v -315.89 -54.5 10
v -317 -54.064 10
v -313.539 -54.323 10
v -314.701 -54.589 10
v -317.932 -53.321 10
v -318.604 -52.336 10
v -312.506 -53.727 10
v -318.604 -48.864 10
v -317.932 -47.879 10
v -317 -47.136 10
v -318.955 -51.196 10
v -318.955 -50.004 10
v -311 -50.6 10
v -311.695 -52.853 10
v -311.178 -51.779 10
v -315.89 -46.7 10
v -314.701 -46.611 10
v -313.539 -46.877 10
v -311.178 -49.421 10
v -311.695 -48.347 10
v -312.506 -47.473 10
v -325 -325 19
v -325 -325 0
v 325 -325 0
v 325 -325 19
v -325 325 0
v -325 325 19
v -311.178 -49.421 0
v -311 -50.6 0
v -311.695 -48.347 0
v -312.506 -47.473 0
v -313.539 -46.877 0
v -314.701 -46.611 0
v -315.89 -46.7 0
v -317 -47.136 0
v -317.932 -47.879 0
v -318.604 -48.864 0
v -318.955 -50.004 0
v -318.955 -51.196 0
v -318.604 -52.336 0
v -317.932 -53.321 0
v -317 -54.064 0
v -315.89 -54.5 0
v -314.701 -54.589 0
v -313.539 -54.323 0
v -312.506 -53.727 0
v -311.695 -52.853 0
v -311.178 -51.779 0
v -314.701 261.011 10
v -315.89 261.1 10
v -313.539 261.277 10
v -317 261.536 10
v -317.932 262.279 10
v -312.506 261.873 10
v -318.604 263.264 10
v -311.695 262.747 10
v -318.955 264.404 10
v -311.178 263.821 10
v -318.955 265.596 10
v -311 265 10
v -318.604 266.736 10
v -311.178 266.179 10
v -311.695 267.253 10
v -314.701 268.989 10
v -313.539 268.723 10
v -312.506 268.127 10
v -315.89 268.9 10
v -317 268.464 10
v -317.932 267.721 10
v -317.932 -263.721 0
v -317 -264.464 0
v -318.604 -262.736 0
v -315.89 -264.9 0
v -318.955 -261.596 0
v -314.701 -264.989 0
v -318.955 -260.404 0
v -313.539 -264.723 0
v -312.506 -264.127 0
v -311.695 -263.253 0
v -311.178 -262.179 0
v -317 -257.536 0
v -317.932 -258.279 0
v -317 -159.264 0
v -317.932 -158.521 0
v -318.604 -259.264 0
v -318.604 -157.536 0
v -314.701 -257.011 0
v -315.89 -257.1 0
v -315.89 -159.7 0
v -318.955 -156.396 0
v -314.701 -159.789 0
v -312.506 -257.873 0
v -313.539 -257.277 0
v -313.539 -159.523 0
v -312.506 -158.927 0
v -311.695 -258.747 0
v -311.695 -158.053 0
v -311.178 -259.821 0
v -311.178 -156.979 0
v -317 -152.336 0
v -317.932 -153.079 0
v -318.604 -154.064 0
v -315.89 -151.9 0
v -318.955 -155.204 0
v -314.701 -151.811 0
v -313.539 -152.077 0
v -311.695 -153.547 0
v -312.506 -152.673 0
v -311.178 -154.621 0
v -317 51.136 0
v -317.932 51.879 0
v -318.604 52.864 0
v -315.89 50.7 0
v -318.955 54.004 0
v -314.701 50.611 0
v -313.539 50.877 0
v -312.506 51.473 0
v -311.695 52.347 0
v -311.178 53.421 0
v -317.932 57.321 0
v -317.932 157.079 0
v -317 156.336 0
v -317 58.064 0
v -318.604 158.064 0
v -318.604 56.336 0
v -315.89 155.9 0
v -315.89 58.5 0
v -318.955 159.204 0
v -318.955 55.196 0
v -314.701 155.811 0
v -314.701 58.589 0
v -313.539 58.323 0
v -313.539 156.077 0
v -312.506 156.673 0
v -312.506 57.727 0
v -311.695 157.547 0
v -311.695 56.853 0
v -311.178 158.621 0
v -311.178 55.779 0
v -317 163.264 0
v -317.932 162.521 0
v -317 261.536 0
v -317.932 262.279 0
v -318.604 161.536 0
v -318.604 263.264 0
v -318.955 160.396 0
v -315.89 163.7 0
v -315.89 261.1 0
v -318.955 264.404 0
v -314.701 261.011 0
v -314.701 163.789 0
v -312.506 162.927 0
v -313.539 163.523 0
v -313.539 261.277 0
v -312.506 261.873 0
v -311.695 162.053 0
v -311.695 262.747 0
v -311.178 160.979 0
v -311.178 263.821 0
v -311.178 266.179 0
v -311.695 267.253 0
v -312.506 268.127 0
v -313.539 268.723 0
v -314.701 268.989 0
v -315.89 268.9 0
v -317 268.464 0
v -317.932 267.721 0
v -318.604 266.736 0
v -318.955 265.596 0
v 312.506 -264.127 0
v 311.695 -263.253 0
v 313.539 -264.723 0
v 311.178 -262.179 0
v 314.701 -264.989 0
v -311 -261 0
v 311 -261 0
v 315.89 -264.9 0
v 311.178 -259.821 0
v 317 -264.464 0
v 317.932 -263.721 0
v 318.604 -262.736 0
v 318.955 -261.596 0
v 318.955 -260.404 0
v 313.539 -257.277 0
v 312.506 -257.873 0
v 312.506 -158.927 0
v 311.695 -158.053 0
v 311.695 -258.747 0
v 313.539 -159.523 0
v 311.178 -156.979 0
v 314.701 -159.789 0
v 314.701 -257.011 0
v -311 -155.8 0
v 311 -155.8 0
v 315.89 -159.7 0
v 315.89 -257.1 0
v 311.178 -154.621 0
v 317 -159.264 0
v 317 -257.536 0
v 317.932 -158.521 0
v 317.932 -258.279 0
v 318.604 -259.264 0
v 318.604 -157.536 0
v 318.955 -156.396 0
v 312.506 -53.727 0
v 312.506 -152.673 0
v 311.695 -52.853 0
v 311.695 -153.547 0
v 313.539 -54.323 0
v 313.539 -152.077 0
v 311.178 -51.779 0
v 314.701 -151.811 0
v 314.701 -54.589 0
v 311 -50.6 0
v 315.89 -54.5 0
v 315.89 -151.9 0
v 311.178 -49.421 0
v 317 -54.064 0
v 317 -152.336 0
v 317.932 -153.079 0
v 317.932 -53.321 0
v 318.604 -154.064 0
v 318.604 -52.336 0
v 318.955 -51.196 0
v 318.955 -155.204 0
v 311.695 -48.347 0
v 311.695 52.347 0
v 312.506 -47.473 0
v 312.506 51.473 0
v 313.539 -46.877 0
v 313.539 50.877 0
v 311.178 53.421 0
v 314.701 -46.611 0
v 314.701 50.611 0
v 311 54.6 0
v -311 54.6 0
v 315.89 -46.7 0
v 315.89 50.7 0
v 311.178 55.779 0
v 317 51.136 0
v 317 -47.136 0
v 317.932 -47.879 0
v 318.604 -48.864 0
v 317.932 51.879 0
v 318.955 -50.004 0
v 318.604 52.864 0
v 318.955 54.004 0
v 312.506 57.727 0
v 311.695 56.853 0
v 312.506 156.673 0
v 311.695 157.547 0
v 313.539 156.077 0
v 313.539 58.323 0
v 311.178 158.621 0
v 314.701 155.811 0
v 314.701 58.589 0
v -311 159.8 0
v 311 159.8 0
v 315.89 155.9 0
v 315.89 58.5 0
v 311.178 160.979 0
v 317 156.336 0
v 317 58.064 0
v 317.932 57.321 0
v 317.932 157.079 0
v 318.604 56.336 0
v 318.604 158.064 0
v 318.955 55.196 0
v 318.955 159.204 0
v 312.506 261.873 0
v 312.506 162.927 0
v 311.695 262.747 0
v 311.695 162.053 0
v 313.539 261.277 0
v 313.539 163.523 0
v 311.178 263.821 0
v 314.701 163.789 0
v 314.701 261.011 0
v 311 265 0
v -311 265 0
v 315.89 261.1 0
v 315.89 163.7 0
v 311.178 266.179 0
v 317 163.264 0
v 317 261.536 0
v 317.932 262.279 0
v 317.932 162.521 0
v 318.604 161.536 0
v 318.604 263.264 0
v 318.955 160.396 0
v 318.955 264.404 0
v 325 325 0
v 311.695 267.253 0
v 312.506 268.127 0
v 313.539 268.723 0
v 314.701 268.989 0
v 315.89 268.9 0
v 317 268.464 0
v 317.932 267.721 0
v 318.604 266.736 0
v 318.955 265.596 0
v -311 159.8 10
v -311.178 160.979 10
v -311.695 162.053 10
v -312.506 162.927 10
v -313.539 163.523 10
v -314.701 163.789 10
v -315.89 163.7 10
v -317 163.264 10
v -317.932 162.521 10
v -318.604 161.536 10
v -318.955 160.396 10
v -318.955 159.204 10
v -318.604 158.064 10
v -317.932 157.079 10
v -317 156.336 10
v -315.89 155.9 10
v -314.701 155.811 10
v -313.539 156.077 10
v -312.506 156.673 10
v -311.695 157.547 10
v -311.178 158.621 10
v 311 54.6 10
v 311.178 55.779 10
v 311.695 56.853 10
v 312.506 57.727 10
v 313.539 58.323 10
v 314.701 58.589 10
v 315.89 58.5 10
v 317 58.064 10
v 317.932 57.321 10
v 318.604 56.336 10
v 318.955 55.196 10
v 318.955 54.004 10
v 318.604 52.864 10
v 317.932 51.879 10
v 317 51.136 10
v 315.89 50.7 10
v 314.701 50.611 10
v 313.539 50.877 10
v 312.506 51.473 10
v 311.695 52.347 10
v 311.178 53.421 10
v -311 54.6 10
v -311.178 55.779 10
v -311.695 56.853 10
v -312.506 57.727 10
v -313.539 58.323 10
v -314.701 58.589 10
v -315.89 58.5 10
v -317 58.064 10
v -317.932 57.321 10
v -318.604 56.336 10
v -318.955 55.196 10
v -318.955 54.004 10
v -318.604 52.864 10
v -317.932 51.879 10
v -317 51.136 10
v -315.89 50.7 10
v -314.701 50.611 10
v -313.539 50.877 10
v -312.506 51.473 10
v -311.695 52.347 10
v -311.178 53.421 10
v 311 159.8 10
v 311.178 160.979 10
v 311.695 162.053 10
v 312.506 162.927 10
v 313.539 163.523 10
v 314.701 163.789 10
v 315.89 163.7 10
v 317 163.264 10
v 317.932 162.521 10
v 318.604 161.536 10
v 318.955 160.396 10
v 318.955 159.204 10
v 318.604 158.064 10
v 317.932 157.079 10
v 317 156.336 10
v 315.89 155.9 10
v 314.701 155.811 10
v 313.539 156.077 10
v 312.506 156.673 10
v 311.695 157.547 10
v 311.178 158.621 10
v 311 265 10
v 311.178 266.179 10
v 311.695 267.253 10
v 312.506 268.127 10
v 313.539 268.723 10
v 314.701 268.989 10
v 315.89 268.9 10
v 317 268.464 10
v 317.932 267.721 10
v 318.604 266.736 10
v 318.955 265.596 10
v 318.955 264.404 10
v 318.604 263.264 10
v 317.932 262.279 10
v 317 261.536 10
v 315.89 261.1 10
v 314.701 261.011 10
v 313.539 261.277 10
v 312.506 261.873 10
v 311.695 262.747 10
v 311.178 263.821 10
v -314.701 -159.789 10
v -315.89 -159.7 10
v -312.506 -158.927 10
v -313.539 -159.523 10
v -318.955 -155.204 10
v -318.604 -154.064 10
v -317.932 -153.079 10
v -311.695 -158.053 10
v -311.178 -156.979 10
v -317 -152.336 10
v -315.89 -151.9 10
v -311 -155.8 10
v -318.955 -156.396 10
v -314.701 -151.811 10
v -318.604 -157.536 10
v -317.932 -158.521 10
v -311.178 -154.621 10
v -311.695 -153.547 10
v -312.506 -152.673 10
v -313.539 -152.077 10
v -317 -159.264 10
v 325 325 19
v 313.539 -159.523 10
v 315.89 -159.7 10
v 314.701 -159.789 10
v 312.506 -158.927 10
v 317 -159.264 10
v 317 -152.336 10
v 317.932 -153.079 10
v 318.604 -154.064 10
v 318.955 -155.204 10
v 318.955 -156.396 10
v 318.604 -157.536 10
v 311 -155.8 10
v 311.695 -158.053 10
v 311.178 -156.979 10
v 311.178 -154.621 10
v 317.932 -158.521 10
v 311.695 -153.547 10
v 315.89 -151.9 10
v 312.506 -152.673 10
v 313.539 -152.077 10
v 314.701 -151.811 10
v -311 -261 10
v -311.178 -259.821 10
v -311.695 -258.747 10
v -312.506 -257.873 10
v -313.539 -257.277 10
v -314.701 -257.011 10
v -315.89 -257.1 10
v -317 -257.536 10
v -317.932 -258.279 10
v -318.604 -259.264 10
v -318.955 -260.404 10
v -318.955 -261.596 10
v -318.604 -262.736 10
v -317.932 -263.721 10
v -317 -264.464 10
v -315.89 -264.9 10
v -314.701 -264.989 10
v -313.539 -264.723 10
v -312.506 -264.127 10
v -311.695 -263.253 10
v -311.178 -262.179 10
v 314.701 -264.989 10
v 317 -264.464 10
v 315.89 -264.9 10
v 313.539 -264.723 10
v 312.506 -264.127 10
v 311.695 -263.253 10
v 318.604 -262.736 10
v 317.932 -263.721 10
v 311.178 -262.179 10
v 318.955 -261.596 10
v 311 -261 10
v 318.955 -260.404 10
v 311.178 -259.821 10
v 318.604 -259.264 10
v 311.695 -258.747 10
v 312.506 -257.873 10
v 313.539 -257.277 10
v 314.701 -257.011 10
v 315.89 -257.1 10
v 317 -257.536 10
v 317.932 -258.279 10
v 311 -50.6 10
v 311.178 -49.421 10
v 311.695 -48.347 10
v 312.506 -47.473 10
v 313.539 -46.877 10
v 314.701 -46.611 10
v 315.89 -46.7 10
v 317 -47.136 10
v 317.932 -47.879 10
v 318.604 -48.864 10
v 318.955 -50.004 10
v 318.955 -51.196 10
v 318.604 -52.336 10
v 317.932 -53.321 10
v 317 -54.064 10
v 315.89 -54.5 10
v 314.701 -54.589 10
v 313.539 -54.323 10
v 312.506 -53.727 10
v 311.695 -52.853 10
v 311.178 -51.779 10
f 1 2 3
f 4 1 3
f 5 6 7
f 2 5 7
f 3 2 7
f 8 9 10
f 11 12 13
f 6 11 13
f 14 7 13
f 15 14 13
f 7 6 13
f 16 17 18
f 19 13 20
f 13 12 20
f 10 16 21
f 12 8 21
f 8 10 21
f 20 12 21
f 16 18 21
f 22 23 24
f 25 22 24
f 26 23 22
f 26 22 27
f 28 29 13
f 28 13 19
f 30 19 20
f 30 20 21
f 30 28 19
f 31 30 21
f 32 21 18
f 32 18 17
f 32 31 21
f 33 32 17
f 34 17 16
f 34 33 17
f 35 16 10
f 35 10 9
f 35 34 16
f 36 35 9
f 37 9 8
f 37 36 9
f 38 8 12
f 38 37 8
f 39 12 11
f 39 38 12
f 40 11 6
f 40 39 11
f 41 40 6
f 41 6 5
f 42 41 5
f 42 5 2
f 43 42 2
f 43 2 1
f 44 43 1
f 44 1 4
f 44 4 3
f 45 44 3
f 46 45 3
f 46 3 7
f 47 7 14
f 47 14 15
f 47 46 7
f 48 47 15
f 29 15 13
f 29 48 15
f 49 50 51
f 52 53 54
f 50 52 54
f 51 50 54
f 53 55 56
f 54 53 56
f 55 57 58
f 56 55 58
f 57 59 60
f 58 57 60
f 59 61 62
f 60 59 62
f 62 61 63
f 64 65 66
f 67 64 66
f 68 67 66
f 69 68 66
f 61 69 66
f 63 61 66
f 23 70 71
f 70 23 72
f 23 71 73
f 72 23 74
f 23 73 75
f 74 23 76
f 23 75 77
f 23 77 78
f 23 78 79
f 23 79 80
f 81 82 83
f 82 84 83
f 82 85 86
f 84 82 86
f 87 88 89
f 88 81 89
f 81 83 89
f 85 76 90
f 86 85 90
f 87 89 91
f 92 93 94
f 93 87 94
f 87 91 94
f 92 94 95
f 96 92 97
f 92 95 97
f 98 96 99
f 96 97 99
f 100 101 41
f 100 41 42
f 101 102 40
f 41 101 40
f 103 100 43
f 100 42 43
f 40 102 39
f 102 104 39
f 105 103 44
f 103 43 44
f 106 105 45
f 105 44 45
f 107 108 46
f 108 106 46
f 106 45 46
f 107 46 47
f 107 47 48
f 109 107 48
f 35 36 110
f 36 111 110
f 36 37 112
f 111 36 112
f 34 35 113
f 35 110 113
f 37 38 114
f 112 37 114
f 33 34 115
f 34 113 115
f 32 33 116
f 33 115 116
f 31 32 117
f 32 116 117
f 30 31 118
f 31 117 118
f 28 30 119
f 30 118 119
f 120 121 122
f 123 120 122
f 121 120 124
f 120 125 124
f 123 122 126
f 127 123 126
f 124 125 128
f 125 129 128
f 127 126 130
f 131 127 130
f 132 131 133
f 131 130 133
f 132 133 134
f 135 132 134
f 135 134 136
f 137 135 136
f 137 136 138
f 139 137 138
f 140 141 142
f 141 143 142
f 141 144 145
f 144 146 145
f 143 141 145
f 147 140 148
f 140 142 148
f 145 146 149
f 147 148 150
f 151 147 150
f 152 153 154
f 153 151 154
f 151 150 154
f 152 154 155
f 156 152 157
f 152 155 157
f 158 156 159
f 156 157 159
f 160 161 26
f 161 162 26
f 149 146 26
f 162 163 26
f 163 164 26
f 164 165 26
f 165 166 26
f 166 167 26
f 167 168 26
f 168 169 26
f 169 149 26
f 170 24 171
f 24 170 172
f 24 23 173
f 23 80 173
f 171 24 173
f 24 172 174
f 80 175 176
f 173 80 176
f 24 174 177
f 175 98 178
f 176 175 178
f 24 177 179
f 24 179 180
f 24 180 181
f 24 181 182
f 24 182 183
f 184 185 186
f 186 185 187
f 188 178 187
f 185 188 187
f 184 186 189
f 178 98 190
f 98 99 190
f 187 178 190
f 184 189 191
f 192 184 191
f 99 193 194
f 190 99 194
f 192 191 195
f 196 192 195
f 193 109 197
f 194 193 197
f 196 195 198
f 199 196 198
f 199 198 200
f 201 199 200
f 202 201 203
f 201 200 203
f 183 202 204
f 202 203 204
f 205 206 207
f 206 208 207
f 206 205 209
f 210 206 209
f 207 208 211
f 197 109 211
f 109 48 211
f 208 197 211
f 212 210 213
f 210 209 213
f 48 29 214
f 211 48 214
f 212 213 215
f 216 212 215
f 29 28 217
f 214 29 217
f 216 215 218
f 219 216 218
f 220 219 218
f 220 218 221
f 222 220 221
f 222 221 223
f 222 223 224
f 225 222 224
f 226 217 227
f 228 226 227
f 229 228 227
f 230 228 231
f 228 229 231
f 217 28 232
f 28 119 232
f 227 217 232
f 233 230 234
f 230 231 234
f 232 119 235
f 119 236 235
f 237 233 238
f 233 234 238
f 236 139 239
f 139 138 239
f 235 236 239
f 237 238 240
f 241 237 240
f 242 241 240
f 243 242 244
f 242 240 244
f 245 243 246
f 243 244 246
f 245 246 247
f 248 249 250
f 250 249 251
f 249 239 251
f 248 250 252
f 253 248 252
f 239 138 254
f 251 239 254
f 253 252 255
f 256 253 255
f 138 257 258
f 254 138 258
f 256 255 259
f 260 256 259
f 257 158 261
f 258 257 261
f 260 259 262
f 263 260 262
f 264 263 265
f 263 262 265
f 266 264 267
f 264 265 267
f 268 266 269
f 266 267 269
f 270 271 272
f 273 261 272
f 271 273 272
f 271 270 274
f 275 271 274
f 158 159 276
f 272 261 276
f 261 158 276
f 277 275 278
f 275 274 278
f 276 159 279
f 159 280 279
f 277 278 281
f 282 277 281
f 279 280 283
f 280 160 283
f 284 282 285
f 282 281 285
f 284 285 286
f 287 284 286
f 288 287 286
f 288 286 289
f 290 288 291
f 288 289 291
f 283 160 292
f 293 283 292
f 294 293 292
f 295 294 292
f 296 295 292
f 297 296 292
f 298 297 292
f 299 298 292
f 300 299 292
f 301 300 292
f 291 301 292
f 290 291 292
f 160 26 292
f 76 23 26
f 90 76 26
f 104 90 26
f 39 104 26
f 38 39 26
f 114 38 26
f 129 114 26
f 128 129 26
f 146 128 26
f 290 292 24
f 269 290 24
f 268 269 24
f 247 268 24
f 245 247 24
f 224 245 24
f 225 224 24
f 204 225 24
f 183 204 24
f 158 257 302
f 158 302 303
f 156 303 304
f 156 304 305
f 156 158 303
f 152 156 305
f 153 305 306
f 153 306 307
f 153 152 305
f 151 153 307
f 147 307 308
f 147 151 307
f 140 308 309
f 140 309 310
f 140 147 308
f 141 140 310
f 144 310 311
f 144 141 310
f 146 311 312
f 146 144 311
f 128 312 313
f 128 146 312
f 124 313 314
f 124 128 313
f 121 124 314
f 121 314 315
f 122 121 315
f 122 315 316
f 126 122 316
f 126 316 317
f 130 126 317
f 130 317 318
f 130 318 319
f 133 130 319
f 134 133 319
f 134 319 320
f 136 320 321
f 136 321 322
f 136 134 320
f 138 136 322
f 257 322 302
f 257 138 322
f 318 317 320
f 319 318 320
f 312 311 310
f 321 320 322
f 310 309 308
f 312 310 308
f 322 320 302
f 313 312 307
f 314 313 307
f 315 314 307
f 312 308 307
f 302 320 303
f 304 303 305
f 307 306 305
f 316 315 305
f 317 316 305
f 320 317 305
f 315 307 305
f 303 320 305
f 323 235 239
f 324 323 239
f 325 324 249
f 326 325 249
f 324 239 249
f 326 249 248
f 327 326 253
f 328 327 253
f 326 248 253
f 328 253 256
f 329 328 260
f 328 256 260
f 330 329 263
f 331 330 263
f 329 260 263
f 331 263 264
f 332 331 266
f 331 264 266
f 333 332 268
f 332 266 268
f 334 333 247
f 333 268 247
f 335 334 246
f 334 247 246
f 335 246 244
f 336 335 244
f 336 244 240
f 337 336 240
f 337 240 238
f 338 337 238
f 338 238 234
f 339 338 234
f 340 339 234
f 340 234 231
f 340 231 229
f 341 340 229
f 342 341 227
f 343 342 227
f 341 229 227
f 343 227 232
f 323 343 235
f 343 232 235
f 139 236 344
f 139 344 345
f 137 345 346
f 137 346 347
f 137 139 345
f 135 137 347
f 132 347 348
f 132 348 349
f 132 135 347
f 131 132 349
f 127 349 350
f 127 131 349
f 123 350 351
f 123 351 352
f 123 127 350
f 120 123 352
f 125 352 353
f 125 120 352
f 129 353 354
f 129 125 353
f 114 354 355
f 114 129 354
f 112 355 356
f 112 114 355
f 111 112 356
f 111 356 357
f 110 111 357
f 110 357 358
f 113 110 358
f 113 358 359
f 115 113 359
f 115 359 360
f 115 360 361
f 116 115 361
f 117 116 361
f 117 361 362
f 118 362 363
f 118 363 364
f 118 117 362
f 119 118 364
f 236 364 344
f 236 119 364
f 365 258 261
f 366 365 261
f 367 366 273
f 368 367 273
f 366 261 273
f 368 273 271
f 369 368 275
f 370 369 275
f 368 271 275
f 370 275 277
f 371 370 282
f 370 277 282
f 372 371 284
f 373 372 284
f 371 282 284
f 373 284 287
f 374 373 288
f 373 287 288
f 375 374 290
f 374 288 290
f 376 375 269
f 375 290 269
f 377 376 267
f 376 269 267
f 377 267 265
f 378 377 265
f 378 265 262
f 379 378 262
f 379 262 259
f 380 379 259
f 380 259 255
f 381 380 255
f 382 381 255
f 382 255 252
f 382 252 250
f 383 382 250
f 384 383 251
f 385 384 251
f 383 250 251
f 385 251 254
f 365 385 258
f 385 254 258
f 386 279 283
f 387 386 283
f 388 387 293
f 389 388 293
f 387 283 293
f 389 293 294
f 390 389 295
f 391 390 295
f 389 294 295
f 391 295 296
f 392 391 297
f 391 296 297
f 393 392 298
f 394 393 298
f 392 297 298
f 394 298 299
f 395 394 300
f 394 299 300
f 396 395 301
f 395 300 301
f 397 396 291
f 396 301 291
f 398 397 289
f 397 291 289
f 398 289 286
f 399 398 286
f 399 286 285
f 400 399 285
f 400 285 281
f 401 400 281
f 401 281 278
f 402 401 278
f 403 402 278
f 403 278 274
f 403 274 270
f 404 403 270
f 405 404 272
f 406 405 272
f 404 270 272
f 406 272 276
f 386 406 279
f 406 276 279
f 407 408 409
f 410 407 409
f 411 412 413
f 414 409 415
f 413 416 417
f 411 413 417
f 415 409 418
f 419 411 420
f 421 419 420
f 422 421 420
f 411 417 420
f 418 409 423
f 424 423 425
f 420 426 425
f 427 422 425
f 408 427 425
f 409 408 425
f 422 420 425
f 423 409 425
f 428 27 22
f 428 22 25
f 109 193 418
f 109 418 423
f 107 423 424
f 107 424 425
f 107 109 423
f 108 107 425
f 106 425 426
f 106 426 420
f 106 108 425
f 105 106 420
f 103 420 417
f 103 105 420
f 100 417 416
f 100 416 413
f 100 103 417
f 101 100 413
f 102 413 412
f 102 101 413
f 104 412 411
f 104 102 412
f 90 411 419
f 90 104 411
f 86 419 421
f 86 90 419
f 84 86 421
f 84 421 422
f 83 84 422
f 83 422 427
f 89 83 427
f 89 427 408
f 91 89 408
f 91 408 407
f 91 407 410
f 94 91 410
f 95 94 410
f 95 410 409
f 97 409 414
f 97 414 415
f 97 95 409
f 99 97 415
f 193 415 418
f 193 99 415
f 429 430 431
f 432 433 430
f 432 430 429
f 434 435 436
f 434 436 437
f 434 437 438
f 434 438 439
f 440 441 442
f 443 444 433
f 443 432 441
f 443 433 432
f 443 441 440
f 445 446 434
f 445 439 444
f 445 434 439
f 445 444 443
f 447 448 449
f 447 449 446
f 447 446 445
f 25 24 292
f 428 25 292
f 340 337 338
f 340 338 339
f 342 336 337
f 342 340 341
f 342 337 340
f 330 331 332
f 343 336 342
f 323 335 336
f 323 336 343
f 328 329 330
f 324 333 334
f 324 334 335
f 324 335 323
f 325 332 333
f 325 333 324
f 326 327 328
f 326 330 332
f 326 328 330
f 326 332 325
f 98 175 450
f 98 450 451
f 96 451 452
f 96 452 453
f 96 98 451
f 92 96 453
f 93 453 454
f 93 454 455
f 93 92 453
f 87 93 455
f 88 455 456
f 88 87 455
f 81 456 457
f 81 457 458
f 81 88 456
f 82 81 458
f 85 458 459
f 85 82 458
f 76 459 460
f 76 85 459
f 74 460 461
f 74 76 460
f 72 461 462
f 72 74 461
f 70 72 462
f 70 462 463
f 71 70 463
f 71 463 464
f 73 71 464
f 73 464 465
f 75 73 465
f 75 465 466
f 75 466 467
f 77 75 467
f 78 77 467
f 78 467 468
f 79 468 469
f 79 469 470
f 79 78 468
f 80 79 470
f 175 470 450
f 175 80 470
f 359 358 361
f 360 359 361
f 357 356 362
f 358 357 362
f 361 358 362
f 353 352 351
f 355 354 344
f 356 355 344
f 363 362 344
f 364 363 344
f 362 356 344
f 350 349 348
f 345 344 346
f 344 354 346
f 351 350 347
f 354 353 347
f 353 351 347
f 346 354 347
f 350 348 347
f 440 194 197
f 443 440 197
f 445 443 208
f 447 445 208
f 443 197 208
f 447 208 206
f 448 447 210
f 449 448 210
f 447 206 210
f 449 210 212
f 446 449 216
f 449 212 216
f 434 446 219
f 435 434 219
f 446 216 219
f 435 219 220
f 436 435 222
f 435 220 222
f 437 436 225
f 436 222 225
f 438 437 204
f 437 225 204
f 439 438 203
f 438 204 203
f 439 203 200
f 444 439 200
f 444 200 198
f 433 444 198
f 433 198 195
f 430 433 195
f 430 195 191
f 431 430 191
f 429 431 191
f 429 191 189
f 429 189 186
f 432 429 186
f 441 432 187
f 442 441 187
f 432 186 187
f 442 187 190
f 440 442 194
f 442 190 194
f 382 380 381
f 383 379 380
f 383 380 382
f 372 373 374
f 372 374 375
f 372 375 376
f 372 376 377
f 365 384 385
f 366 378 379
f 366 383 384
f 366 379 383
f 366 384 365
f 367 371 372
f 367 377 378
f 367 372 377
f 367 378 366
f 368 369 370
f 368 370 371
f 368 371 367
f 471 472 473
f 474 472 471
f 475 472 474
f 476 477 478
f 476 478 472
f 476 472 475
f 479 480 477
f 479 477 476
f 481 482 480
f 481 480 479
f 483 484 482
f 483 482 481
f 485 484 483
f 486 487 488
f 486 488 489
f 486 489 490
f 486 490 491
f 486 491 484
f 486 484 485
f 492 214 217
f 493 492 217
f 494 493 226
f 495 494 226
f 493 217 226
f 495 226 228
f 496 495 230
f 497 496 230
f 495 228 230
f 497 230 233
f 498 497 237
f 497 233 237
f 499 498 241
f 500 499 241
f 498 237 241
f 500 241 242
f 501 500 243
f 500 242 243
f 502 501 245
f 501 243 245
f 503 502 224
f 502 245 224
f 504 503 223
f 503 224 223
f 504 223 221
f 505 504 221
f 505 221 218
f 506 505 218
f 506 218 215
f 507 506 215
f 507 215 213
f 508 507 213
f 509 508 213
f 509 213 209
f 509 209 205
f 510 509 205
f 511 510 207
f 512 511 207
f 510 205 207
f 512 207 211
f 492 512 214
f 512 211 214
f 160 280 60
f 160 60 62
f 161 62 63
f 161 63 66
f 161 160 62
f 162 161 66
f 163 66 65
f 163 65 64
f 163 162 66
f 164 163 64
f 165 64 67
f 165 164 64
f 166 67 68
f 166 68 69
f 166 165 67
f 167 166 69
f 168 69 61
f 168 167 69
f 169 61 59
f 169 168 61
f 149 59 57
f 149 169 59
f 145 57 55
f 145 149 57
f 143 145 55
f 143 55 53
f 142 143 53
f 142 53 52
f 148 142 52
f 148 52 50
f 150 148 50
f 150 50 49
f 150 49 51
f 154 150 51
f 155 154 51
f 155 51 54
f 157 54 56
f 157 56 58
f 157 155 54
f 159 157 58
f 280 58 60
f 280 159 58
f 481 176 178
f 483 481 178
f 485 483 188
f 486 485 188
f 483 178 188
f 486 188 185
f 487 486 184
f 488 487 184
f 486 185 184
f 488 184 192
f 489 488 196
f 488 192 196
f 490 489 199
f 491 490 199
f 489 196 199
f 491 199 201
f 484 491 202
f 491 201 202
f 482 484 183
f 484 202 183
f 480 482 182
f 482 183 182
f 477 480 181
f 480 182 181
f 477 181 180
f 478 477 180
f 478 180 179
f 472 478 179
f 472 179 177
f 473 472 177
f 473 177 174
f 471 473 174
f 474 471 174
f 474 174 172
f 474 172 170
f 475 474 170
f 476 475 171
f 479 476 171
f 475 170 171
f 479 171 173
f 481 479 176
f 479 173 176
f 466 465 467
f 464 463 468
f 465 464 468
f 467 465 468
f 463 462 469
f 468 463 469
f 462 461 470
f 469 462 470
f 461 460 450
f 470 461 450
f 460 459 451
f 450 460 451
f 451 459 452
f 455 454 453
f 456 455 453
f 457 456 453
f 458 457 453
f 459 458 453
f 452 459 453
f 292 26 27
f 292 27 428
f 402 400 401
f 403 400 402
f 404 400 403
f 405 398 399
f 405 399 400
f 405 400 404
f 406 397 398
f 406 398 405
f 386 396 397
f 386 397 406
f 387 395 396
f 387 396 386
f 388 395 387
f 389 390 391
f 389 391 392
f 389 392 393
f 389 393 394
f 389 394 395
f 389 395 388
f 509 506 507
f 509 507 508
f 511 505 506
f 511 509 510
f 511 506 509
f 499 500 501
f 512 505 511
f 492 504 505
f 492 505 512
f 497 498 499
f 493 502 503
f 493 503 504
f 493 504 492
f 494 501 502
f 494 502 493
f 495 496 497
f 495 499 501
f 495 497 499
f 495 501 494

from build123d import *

# Parameters (mm, degrees)
F0_W     = 650
F0_H     = 650
F0_R     = 4
F1_DEPTH = 19
F2_DEPTH = 10


# Not quite as in the source:
# - a pattern or mirror of a feature is missing from the dataset's text; its kind, count and spacing are read off the source's solid


with BuildPart() as f1:
    # F0 (on Top) → F1 (new body)
    with BuildSketch(Plane.XY):
        Rectangle(F0_W, F0_H)
        with Locations((-315, -261)):
            Circle(F0_R, mode=Mode.SUBTRACT)
        with Locations((-315, -155.8)):
            Circle(F0_R, mode=Mode.SUBTRACT)
        with Locations((-315, -50.6)):
            Circle(F0_R, mode=Mode.SUBTRACT)
        with Locations((-315, 54.6)):
            Circle(F0_R, mode=Mode.SUBTRACT)
        with Locations((-315, 159.8)):
            Circle(F0_R, mode=Mode.SUBTRACT)
        with Locations((-315, 265)):
            Circle(F0_R, mode=Mode.SUBTRACT)
        with Locations((-315, 265)):
            Circle(F0_R)
        with Locations((-315, 159.8)):
            Circle(F0_R)
        with Locations((-315, 54.6)):
            Circle(F0_R)
        with Locations((-315, -50.6)):
            Circle(F0_R)
        with Locations((-315, -155.8)):
            Circle(F0_R)
        with Locations((-315, -261)):
            Circle(F0_R)
    extrude(amount=F1_DEPTH)

    # F0 (on Top) → F2 (cut)
    with BuildSketch(Plane.XY):
        with Locations((-315, 265)):
            Circle(F0_R)
        with Locations((-315, 159.8)):
            Circle(F0_R)
        with Locations((-315, 54.6)):
            Circle(F0_R)
        with Locations((-315, -50.6)):
            Circle(F0_R)
        with Locations((-315, -155.8)):
            Circle(F0_R)
        with Locations((-315, -261)):
            Circle(F0_R)
    f2 = extrude(amount=F2_DEPTH, mode=Mode.SUBTRACT)

    # F2_copies: F2 across plane
    add(f2.mirror(Plane(origin=(0, 0, 0), x_dir=(0, 0, 1), z_dir=(1, 0, 0))), mode=Mode.SUBTRACT)


solid = f1.part
